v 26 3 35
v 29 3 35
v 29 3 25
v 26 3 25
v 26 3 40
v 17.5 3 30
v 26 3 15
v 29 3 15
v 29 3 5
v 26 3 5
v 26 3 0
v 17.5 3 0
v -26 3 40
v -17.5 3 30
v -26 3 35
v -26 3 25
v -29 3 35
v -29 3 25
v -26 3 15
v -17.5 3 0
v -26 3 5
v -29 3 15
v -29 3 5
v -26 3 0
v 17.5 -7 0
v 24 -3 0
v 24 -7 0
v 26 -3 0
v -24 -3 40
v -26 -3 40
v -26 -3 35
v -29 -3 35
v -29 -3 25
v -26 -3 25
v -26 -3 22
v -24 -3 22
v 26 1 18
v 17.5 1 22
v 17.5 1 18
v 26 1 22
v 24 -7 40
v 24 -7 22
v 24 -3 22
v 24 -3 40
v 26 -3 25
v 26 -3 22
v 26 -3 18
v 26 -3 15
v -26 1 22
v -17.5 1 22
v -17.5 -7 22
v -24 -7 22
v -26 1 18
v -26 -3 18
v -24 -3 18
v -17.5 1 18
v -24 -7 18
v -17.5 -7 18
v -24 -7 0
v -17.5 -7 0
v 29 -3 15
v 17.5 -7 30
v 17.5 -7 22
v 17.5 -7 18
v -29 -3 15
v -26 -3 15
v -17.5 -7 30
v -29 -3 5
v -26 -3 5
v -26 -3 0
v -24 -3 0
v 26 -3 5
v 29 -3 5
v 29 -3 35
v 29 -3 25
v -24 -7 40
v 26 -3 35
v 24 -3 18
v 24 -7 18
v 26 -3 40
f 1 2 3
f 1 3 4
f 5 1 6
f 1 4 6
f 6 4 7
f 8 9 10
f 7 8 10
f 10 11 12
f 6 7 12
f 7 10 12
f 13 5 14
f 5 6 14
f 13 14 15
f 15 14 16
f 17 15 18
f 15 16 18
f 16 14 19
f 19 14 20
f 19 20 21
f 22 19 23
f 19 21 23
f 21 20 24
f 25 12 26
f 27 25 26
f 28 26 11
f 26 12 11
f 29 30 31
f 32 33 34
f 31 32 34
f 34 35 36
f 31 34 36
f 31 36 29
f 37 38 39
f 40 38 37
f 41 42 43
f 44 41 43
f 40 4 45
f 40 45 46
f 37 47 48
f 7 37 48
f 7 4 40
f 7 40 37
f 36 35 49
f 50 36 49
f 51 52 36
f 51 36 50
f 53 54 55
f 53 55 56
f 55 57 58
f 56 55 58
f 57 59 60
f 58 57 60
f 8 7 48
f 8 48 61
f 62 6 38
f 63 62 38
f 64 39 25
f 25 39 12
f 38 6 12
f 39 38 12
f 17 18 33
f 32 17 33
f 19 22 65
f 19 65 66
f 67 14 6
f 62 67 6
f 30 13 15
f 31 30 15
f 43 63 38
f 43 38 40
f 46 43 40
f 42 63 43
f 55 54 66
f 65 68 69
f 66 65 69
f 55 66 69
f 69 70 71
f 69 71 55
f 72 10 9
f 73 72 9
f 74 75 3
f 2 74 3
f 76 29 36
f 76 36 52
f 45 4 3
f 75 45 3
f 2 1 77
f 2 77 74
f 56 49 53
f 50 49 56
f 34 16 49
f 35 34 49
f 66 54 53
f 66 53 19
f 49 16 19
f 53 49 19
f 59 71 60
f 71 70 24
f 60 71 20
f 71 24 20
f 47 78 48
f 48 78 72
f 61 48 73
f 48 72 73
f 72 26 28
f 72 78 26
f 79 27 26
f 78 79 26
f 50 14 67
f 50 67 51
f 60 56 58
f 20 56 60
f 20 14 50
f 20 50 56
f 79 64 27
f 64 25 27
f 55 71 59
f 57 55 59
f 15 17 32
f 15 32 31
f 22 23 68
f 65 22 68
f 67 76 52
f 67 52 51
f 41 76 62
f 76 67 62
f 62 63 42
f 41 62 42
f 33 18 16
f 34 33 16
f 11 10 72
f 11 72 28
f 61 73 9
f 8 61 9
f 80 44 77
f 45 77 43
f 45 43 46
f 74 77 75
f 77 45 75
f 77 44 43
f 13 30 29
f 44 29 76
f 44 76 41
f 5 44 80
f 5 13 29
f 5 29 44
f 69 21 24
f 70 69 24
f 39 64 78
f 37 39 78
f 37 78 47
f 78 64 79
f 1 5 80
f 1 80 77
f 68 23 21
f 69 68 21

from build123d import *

# Parameters (mm, degrees)
BOSS_EXTRUDE1_DEPTH = 40
SKETCH2_W           = 35
SKETCH2_H           = 30
SKETCH2_W_2         = 3
SKETCH2_H_2         = 10
SKETCH2_H_3         = 5
CUT_EXTRUDE1_DEPTH  = 51.408332645
SKETCH3_W           = 58
SKETCH3_H           = 4
CUT_EXTRUDE2_DEPTH  = 8


with BuildPart() as part:
    # Sketch1 → Boss-Extrude1 (new body)
    with BuildSketch(Plane.XY):
        Polygon((24, -3), (29, -3), (29, 3), (-29, 3), (-29, -3), (-24, -3), (-24, -7), (24, -7), align=None)
    extrude(amount=BOSS_EXTRUDE1_DEPTH)

    # Sketch2 → Cut-Extrude1 (cut, through all)
    with BuildSketch(Plane(origin=(0, 3, 0), x_dir=(1, 0, 0), z_dir=(0, 1, 0))):
        with Locations((0, -15)):
            Rectangle(SKETCH2_W, SKETCH2_H)
        with Locations((27.5, -20)):
            Rectangle(SKETCH2_W_2, SKETCH2_H_2)
        with Locations((-27.5, -20)):
            Rectangle(SKETCH2_W_2, SKETCH2_H_2)
        with Locations((27.5, -37.5)):
            Rectangle(SKETCH2_W_2, SKETCH2_H_3)
        with Locations((-27.5, -37.5)):
            Rectangle(SKETCH2_W_2, SKETCH2_H_3)
        with Locations((-82.5, -20)):
            Rectangle(SKETCH2_W_2, SKETCH2_H_2)
        with Locations((27.5, 0)):
            Rectangle(SKETCH2_W_2, SKETCH2_H_2)
        with Locations((-27.5, 0)):
            Rectangle(SKETCH2_W_2, SKETCH2_H_2)
        with Locations((-82.5, 0)):
            Rectangle(SKETCH2_W_2, SKETCH2_H_2)
    extrude(amount=-CUT_EXTRUDE1_DEPTH, mode=Mode.SUBTRACT)

    # Sketch3 → Cut-Extrude2 (cut)
    with BuildSketch(Plane.XZ.offset(7)):
        with Locations((0, 20)):
            Rectangle(SKETCH3_W, SKETCH3_H)
    extrude(amount=-CUT_EXTRUDE2_DEPTH, mode=Mode.SUBTRACT)


solid = part.part
